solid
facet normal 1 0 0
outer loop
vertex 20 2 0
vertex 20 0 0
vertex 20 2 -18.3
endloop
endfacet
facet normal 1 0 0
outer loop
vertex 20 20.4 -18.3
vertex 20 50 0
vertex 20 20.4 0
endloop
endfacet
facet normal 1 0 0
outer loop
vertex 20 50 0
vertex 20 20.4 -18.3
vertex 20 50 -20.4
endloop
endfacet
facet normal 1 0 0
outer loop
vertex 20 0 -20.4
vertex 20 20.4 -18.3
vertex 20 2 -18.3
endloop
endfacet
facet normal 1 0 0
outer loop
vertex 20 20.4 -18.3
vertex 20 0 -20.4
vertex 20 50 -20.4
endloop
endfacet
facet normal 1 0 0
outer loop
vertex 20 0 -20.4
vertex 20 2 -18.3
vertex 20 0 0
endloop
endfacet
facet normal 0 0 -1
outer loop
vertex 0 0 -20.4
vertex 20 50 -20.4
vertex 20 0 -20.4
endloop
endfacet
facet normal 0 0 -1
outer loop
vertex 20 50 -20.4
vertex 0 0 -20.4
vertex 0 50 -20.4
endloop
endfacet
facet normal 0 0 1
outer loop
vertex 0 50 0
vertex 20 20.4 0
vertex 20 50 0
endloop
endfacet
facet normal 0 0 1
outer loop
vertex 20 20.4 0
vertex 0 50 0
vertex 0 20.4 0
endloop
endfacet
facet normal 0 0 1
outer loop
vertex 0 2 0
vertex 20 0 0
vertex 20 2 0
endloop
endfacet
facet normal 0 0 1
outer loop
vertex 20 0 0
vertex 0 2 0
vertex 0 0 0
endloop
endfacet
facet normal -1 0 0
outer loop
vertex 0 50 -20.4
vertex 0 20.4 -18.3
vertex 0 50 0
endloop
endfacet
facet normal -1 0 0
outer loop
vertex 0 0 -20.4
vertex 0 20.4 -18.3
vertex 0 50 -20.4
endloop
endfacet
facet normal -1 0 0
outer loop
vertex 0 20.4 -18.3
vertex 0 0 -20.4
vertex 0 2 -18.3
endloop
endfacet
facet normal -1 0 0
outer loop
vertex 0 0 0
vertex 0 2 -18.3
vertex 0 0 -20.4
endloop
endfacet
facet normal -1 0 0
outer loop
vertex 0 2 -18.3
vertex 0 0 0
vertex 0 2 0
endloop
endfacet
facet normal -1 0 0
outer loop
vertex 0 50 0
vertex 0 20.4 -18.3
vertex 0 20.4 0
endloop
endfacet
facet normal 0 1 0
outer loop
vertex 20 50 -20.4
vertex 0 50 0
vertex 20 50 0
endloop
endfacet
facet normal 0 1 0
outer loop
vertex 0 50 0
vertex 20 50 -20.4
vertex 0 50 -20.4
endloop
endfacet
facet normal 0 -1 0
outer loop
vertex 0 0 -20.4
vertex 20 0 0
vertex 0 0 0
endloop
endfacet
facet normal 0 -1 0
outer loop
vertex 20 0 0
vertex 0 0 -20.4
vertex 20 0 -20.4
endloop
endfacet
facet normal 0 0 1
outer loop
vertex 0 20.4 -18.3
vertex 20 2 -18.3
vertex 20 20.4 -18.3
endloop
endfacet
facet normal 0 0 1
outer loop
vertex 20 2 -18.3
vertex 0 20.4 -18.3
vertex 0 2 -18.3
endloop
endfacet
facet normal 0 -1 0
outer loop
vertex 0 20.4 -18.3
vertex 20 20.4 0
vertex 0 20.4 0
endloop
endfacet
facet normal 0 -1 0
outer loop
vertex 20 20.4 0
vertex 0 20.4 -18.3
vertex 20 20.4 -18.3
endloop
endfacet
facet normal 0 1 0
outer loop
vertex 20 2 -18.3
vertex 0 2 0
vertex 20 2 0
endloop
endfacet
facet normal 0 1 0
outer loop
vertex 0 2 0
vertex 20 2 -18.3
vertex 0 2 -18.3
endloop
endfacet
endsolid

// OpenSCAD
length = 50;
gap = 18.4;
wall = 2;
height = gap + wall;
width = 20;
$fn = 128;

mirror([0,0,180])  difference() {
  cube([width, length, height]);
  
  translate([-0.1,wall,-0.1]) cube([gap*2, gap, gap]);

}
